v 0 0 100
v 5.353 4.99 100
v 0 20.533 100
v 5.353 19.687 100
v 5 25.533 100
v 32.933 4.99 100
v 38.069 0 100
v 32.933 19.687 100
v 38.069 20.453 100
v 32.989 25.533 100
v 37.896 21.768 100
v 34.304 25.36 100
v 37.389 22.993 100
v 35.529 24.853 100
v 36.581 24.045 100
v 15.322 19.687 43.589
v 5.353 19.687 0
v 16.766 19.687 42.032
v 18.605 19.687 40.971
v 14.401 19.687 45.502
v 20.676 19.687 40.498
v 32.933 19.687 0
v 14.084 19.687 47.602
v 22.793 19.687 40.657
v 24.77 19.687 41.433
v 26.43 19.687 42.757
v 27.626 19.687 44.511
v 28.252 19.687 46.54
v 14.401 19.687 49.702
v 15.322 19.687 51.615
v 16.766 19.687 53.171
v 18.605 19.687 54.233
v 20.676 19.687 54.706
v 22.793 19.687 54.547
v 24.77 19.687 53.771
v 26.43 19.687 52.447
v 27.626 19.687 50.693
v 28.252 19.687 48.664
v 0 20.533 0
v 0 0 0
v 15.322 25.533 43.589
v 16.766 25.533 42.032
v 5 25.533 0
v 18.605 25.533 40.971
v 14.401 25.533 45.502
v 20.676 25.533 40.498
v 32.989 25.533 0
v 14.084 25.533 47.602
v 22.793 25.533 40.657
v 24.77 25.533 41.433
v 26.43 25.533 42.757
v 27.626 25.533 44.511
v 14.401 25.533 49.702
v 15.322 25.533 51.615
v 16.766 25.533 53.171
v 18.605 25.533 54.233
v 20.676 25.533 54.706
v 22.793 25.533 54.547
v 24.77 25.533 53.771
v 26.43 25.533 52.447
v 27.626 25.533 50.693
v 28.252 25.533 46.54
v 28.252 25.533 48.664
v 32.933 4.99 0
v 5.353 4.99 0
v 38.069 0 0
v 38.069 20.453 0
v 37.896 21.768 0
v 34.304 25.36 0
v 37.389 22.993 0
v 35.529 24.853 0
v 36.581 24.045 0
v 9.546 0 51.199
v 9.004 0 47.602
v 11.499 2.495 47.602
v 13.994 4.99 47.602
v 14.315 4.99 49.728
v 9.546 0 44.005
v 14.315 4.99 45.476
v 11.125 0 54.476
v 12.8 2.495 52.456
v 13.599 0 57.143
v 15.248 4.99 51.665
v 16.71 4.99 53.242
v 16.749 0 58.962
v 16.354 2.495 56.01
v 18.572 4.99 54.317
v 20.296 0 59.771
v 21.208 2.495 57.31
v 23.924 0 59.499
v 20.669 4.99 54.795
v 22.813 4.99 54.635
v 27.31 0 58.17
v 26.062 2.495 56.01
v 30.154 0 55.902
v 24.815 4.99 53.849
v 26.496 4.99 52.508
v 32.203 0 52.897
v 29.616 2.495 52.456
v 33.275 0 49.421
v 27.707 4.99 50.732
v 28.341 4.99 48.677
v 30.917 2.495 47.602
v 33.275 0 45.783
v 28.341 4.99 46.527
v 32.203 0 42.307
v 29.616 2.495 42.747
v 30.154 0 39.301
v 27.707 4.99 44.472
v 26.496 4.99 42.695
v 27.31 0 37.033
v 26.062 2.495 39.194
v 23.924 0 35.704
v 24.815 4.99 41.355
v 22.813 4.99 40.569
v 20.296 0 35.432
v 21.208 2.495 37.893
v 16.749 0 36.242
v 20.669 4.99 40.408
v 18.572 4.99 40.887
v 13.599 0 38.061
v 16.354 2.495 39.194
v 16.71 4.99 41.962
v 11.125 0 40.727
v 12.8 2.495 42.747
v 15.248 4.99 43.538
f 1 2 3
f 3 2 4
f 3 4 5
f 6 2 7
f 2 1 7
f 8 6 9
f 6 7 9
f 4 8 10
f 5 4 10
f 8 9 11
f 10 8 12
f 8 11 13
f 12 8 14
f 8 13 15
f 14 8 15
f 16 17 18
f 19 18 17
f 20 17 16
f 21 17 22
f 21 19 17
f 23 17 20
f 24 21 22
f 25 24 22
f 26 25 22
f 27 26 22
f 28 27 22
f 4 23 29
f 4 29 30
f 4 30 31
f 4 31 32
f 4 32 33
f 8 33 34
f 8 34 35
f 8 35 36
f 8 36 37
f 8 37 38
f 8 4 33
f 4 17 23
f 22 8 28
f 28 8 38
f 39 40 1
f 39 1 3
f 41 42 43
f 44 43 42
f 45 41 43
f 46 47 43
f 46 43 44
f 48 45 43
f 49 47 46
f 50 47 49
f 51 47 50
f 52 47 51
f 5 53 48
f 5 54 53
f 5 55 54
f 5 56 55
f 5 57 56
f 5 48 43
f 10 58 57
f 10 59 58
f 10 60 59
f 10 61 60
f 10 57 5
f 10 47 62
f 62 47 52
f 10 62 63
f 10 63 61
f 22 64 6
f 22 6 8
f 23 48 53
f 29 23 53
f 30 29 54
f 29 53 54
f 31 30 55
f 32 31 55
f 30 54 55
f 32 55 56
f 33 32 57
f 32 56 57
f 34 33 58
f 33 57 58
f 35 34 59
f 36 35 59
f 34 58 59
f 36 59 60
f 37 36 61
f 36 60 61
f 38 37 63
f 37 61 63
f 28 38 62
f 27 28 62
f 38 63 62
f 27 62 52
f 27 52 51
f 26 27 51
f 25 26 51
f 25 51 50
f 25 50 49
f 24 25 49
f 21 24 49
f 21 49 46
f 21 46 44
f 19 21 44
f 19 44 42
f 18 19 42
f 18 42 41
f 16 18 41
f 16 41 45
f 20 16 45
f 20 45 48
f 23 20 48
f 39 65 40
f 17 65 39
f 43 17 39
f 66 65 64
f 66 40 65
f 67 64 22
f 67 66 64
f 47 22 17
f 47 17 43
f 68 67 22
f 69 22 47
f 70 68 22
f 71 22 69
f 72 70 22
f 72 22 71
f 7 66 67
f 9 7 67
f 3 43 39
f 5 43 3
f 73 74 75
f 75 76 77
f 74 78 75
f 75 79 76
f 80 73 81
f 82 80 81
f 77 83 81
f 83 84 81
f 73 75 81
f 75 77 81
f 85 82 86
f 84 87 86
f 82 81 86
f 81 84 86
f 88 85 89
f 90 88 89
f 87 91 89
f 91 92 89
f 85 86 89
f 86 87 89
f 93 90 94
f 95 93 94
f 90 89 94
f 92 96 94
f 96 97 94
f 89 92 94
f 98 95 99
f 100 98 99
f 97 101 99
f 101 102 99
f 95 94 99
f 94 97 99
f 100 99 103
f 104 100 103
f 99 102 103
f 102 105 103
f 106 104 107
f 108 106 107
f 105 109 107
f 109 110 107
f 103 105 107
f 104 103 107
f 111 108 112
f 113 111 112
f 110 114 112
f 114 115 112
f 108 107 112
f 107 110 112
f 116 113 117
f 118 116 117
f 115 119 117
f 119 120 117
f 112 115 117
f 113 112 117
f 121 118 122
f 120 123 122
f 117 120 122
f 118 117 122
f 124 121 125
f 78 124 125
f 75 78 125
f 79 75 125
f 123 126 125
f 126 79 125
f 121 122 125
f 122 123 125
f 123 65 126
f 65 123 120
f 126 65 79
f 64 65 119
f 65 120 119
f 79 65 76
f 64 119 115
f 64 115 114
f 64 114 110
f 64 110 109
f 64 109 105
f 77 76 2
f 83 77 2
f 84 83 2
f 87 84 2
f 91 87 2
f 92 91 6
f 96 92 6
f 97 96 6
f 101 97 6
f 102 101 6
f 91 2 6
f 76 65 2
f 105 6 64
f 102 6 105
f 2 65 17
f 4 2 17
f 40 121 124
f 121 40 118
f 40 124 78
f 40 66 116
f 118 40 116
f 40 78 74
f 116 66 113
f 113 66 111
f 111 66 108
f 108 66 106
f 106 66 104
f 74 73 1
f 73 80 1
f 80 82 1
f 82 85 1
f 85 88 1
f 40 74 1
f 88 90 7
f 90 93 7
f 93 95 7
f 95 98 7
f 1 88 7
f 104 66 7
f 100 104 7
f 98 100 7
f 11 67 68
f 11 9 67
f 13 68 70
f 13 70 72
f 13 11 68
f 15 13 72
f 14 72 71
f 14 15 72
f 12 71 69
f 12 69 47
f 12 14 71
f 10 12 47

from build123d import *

# Parameters (mm, degrees)
F0_W     = 38.0692742765
F0_H     = 25.5331452936
F1_DEPTH = 100
F2_DEPTH = 23.622
F3_R     = 7.1236409115
F4_DEPTH = 56.642
F5_R     = 5.08
F6_SIZE  = 5.08
F7_SIZE  = 5
F8_W     = 27.580646798
F8_H     = 14.6975801326
F9_DEPTH = 109.9


with BuildPart() as f1:
    # F0 (on Top) → F1 (new body)
    with BuildSketch(Plane.XY):
        with Locations((19.0346371382, 12.7665726468)):
            Rectangle(F0_W, F0_H)
    extrude(amount=F1_DEPTH)

    # F2 (add): a face of the model
    f2_faces = [f1.faces().sort_by_distance(p)[0] for p in [
        (38.0692742765, 12.7665726468, 50),
    ]]
    extrude(f2_faces, amount=-F2_DEPTH)

    # F3 (on face) → F4 (cut)
    with BuildSketch(Plane(origin=(0, 25.5331452936, 0), x_dir=(-1, 0, 0), z_dir=(0, 1, 0))):
        with Locations((-21.2079435587, 47.6018153131)):
            Circle(F3_R)
    extrude(amount=-F4_DEPTH, mode=Mode.SUBTRACT)

    # F5
    f5_edges = [f1.edges().sort_by_distance(p)[0] for p in [
        (38.069274, 25.533145, 50),
    ]]
    fillet(f5_edges, radius=F5_R)

    # F6
    f6_edges = [f1.edges().sort_by_distance(p)[0] for p in [
        (28.331584, 0, 47.601815),
    ]]
    chamfer(f6_edges, length=F6_SIZE)

    # F7
    f7_edges = [f1.edges().sort_by_distance(p)[0] for p in [
        (0, 25.533145, 50),
    ]]
    chamfer(f7_edges, length=F7_SIZE)

    # F8 (on face) → F9 (cut)
    with BuildSketch(Plane.XY.offset(100)):
        with Locations((19.1431464627, 12.3387097847)):
            Rectangle(F8_W, F8_H)
    extrude(amount=-F9_DEPTH, mode=Mode.SUBTRACT)


solid = f1.part
